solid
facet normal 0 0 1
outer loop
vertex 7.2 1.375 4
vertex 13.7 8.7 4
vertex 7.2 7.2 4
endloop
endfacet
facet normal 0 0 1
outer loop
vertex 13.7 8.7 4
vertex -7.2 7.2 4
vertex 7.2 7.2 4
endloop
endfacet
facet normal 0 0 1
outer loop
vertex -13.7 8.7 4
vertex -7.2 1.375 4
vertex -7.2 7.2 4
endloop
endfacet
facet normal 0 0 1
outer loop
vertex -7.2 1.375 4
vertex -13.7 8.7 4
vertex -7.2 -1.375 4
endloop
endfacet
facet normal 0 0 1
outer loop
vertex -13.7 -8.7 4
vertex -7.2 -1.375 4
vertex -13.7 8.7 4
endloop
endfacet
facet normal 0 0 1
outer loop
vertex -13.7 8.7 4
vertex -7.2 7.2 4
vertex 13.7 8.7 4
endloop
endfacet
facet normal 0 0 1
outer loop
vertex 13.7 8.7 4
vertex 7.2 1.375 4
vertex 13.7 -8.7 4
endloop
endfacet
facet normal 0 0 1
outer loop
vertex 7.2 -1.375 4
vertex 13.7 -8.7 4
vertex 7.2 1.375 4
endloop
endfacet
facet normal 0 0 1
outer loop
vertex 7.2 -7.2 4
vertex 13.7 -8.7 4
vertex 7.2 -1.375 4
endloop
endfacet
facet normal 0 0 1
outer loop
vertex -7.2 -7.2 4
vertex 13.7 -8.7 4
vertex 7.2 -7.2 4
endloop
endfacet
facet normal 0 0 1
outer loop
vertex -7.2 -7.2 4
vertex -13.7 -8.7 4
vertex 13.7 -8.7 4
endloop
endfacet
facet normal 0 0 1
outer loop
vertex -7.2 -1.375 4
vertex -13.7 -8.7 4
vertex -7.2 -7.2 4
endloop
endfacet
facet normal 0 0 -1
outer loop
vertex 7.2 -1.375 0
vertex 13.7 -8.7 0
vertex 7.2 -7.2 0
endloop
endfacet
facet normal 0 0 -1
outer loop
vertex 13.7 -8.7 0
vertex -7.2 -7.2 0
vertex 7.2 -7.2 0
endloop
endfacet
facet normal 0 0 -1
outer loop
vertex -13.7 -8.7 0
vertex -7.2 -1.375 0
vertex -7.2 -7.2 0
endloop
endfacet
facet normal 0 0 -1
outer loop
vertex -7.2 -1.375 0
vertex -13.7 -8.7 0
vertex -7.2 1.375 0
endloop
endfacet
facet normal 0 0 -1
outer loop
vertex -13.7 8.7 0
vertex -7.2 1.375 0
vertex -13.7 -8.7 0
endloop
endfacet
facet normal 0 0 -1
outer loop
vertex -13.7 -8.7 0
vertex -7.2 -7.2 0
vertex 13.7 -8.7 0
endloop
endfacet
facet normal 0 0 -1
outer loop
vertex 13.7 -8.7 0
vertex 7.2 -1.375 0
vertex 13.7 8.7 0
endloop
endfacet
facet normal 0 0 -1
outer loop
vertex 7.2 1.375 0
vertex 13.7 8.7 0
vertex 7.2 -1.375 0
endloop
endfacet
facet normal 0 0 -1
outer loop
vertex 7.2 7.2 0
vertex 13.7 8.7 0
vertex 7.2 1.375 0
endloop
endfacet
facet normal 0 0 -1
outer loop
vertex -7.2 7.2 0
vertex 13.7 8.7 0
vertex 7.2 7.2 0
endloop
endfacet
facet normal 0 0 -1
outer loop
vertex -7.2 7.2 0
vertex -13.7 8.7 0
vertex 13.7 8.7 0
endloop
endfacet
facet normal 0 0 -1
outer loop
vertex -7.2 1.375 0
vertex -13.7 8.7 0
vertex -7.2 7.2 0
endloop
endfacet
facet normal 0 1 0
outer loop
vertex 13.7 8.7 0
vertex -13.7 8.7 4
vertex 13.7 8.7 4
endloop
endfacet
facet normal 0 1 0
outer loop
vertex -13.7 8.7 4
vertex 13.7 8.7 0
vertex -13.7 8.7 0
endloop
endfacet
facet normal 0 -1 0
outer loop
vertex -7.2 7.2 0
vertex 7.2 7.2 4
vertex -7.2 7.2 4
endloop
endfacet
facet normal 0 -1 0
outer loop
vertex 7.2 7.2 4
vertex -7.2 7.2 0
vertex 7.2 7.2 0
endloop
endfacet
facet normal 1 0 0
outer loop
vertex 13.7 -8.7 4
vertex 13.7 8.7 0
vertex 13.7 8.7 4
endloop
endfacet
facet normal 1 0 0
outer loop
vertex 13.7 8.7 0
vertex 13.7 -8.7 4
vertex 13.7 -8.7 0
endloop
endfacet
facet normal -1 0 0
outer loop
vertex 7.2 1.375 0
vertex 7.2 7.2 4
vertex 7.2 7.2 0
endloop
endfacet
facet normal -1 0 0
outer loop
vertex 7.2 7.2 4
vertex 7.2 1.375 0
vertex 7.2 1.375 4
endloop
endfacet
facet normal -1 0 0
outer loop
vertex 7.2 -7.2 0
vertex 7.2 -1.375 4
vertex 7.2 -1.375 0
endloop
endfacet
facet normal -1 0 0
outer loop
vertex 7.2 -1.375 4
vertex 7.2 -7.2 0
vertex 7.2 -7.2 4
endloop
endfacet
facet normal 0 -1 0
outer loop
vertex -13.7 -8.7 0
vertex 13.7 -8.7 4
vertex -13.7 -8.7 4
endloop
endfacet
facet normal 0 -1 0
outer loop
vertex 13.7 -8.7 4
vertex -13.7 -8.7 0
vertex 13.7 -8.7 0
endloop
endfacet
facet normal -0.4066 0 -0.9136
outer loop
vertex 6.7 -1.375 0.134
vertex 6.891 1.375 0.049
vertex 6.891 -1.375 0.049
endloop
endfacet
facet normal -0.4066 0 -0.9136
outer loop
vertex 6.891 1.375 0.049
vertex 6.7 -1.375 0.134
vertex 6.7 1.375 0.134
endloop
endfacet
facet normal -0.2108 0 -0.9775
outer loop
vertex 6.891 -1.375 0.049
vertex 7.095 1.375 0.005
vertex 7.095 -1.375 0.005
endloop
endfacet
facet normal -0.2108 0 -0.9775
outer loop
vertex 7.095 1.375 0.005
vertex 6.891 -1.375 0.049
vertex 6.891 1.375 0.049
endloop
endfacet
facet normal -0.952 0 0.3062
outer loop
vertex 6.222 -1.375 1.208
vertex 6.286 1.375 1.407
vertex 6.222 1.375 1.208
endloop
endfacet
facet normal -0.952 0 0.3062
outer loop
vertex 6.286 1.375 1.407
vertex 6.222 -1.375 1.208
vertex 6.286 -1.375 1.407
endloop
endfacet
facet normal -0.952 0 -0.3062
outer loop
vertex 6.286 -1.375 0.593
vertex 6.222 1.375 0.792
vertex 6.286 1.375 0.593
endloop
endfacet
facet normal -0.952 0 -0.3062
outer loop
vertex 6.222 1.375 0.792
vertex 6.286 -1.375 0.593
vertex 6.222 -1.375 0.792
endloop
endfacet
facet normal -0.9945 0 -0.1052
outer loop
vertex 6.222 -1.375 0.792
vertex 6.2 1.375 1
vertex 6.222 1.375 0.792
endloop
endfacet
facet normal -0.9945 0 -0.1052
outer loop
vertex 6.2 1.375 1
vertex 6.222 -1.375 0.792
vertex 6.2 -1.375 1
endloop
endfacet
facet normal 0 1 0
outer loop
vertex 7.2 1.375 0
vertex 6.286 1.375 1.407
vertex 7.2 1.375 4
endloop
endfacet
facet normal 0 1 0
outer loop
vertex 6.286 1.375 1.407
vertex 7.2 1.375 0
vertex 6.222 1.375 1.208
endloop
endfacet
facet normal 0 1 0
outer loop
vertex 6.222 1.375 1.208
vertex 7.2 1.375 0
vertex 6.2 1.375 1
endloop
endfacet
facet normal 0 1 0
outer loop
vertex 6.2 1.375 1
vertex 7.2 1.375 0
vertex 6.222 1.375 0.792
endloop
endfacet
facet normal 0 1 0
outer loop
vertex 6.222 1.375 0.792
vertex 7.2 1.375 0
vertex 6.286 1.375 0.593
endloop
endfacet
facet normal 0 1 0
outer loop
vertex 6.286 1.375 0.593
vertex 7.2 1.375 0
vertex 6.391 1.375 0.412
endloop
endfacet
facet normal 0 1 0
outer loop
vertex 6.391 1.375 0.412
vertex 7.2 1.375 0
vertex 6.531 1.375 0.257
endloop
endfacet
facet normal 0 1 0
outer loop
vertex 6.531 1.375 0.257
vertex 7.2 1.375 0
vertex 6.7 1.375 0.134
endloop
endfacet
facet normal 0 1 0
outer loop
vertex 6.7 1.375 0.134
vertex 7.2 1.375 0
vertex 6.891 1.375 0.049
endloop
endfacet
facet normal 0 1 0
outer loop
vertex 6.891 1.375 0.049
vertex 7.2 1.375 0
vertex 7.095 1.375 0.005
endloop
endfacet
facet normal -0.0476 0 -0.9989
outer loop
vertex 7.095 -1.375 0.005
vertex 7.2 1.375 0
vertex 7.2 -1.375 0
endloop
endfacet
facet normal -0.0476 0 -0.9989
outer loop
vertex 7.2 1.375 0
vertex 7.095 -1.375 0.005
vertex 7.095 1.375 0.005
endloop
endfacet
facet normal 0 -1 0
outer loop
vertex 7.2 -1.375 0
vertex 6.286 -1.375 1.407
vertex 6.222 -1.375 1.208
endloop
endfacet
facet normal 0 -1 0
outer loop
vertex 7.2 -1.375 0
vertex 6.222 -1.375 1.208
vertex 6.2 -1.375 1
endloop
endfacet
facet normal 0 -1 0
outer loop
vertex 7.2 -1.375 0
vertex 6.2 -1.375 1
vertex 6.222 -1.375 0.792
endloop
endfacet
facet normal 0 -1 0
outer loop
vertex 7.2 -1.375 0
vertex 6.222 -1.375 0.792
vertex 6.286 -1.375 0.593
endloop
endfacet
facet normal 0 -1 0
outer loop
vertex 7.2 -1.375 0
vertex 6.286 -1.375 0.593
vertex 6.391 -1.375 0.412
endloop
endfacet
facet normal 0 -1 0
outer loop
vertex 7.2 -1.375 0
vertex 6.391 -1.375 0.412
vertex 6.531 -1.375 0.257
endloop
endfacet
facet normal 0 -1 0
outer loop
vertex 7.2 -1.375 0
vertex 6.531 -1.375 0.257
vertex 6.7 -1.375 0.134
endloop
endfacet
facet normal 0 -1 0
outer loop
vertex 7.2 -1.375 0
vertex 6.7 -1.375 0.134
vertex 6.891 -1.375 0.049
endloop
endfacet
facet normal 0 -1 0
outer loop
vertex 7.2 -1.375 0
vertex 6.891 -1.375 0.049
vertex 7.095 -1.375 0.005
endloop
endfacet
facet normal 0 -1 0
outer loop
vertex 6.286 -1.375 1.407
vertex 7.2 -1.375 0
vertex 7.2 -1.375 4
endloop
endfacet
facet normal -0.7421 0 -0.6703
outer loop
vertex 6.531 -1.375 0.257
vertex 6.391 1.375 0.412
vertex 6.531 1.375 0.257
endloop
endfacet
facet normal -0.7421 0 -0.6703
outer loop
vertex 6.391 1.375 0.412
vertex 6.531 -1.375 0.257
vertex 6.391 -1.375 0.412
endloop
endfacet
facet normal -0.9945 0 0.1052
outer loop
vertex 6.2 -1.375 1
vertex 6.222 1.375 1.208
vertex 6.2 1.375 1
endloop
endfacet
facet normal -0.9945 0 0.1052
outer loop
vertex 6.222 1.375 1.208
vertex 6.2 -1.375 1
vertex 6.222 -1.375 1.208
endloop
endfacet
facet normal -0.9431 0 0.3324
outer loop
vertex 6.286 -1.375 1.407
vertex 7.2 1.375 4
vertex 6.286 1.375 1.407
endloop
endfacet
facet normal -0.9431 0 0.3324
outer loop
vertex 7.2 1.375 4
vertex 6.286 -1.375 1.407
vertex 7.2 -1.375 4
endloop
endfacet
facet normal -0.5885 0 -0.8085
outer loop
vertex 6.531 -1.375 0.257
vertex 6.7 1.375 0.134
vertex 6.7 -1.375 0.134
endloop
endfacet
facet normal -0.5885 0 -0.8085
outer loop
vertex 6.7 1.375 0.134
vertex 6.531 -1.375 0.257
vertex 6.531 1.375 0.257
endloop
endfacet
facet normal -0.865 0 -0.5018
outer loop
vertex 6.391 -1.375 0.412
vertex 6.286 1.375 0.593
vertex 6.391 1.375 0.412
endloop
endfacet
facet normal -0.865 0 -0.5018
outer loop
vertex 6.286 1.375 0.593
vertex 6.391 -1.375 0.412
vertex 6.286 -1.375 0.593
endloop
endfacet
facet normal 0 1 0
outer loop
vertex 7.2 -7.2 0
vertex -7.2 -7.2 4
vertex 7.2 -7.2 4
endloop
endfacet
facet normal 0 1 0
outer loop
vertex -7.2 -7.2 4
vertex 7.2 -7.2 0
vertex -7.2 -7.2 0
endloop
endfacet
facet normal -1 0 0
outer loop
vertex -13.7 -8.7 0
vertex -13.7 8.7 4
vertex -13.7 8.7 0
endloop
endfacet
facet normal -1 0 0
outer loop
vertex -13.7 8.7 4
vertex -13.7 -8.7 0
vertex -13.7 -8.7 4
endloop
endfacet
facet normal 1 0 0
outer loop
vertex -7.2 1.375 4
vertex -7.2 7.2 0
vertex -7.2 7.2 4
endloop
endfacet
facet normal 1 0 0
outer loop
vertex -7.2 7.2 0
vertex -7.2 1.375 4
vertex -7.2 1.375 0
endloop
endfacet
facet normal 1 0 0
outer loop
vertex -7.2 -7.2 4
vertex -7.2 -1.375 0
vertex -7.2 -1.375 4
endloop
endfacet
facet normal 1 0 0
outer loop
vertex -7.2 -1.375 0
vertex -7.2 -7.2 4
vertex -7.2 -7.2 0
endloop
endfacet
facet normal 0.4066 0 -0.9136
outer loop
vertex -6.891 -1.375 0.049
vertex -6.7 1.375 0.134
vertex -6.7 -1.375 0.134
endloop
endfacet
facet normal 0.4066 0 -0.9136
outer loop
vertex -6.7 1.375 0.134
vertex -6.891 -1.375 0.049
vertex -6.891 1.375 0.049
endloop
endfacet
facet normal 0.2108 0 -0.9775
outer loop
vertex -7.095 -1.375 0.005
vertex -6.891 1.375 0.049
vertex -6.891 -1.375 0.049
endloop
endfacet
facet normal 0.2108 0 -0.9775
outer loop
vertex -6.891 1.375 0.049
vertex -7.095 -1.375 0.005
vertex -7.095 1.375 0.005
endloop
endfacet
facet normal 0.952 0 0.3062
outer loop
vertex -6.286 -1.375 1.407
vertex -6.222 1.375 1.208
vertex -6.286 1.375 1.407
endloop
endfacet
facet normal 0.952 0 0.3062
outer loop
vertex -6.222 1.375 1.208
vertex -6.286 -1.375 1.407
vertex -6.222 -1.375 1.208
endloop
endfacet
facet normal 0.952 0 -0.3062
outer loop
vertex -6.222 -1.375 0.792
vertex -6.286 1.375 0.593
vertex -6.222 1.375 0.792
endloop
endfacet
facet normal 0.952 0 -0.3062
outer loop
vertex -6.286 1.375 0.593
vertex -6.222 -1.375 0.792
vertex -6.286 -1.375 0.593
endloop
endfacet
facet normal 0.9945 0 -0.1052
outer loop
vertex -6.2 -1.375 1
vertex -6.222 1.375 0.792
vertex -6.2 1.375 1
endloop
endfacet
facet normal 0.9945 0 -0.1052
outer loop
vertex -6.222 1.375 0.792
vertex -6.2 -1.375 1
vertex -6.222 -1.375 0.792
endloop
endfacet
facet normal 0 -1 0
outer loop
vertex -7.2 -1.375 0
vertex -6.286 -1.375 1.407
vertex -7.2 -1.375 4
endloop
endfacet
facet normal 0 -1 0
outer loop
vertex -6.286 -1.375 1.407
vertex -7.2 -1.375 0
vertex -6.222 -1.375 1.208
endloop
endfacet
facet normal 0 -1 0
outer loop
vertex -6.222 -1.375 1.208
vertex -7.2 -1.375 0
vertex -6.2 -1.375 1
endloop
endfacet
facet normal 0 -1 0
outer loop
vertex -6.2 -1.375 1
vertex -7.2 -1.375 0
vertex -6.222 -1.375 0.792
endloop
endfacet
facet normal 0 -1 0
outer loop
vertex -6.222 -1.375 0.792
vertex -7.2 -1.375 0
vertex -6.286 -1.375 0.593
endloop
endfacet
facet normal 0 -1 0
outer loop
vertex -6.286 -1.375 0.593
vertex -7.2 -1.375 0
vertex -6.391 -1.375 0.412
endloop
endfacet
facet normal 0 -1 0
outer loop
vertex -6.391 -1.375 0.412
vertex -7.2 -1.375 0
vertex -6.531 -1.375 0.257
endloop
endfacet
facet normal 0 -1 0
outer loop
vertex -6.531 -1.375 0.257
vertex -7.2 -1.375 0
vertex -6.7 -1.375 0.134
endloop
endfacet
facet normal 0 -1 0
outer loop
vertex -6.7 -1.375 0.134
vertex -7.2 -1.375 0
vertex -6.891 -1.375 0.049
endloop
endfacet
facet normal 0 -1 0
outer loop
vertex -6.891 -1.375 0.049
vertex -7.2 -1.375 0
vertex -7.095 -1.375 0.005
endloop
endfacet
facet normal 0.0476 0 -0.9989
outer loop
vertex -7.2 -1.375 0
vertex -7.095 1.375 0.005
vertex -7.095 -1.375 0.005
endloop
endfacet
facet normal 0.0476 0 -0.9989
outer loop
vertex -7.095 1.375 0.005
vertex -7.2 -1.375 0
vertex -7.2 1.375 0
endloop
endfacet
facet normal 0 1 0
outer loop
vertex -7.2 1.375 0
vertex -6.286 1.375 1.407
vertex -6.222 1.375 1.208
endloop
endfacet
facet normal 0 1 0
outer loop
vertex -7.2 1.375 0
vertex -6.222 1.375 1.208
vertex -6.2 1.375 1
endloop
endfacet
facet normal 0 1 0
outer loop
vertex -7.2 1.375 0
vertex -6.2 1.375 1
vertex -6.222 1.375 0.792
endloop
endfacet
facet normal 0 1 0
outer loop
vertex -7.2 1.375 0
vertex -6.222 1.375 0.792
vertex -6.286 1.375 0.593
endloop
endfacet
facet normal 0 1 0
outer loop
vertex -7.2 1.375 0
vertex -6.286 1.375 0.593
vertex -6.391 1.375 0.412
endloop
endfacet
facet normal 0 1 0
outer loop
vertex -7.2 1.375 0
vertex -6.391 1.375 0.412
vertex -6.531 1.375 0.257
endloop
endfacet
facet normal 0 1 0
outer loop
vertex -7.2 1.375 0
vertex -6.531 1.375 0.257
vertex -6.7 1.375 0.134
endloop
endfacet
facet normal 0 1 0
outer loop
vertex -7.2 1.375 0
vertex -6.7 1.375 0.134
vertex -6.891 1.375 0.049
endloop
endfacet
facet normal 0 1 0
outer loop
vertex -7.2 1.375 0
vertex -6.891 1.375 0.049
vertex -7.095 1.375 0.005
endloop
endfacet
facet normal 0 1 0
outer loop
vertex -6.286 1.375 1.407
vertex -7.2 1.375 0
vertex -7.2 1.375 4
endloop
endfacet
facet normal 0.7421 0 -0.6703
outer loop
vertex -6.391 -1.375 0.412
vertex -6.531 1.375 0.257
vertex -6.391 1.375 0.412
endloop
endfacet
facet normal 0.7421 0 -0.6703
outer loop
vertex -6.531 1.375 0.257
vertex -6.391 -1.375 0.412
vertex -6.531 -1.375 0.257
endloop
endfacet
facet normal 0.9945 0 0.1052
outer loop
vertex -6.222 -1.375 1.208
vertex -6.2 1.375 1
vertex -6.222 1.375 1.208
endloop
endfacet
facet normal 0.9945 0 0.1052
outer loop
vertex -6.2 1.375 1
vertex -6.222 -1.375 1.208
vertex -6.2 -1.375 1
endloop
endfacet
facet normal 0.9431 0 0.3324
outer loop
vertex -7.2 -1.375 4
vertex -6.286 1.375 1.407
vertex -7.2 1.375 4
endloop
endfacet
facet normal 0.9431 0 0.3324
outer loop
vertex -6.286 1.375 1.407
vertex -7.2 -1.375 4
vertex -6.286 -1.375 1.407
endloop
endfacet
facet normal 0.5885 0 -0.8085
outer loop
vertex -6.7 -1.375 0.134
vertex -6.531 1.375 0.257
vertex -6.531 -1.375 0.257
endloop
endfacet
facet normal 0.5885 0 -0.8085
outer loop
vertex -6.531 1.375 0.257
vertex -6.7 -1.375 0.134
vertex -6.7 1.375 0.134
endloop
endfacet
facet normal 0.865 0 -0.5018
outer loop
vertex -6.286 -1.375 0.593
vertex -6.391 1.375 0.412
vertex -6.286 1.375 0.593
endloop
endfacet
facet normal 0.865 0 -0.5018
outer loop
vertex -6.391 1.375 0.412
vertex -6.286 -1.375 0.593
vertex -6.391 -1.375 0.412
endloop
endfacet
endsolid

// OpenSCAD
union () {
  union () {
    translate ([0, 7.95, 2]) {
      cube ([17.4, 1.5, 4], center=true);
    }
    translate ([10.45, 0, 2]) {
      cube ([6.5, 17.4, 4], center=true);
    }
    hull () {
      translate ([7.95, 0, 2]) {
        cube ([1.5, 2.75, 4], center=true);
      }
      translate ([7.2, 0, 1]) {
        rotate (a=90.0, v=[1, 0, 0]) {
          cylinder ($fn=30, h=2.75, r=1, center=true);
        }
      }
    }
  }
  mirror ([0, 1, 0]) {
    mirror ([1, 0, 0]) {
      union () {
        translate ([0, 7.95, 2]) {
          cube ([17.4, 1.5, 4], center=true);
        }
        translate ([10.45, 0, 2]) {
          cube ([6.5, 17.4, 4], center=true);
        }
        hull () {
          translate ([7.95, 0, 2]) {
            cube ([1.5, 2.75, 4], center=true);
          }
          translate ([7.2, 0, 1]) {
            rotate (a=90.0, v=[1, 0, 0]) {
              cylinder ($fn=30, h=2.75, r=1, center=true);
            }
          }
        }
      }
    }
  }
}
